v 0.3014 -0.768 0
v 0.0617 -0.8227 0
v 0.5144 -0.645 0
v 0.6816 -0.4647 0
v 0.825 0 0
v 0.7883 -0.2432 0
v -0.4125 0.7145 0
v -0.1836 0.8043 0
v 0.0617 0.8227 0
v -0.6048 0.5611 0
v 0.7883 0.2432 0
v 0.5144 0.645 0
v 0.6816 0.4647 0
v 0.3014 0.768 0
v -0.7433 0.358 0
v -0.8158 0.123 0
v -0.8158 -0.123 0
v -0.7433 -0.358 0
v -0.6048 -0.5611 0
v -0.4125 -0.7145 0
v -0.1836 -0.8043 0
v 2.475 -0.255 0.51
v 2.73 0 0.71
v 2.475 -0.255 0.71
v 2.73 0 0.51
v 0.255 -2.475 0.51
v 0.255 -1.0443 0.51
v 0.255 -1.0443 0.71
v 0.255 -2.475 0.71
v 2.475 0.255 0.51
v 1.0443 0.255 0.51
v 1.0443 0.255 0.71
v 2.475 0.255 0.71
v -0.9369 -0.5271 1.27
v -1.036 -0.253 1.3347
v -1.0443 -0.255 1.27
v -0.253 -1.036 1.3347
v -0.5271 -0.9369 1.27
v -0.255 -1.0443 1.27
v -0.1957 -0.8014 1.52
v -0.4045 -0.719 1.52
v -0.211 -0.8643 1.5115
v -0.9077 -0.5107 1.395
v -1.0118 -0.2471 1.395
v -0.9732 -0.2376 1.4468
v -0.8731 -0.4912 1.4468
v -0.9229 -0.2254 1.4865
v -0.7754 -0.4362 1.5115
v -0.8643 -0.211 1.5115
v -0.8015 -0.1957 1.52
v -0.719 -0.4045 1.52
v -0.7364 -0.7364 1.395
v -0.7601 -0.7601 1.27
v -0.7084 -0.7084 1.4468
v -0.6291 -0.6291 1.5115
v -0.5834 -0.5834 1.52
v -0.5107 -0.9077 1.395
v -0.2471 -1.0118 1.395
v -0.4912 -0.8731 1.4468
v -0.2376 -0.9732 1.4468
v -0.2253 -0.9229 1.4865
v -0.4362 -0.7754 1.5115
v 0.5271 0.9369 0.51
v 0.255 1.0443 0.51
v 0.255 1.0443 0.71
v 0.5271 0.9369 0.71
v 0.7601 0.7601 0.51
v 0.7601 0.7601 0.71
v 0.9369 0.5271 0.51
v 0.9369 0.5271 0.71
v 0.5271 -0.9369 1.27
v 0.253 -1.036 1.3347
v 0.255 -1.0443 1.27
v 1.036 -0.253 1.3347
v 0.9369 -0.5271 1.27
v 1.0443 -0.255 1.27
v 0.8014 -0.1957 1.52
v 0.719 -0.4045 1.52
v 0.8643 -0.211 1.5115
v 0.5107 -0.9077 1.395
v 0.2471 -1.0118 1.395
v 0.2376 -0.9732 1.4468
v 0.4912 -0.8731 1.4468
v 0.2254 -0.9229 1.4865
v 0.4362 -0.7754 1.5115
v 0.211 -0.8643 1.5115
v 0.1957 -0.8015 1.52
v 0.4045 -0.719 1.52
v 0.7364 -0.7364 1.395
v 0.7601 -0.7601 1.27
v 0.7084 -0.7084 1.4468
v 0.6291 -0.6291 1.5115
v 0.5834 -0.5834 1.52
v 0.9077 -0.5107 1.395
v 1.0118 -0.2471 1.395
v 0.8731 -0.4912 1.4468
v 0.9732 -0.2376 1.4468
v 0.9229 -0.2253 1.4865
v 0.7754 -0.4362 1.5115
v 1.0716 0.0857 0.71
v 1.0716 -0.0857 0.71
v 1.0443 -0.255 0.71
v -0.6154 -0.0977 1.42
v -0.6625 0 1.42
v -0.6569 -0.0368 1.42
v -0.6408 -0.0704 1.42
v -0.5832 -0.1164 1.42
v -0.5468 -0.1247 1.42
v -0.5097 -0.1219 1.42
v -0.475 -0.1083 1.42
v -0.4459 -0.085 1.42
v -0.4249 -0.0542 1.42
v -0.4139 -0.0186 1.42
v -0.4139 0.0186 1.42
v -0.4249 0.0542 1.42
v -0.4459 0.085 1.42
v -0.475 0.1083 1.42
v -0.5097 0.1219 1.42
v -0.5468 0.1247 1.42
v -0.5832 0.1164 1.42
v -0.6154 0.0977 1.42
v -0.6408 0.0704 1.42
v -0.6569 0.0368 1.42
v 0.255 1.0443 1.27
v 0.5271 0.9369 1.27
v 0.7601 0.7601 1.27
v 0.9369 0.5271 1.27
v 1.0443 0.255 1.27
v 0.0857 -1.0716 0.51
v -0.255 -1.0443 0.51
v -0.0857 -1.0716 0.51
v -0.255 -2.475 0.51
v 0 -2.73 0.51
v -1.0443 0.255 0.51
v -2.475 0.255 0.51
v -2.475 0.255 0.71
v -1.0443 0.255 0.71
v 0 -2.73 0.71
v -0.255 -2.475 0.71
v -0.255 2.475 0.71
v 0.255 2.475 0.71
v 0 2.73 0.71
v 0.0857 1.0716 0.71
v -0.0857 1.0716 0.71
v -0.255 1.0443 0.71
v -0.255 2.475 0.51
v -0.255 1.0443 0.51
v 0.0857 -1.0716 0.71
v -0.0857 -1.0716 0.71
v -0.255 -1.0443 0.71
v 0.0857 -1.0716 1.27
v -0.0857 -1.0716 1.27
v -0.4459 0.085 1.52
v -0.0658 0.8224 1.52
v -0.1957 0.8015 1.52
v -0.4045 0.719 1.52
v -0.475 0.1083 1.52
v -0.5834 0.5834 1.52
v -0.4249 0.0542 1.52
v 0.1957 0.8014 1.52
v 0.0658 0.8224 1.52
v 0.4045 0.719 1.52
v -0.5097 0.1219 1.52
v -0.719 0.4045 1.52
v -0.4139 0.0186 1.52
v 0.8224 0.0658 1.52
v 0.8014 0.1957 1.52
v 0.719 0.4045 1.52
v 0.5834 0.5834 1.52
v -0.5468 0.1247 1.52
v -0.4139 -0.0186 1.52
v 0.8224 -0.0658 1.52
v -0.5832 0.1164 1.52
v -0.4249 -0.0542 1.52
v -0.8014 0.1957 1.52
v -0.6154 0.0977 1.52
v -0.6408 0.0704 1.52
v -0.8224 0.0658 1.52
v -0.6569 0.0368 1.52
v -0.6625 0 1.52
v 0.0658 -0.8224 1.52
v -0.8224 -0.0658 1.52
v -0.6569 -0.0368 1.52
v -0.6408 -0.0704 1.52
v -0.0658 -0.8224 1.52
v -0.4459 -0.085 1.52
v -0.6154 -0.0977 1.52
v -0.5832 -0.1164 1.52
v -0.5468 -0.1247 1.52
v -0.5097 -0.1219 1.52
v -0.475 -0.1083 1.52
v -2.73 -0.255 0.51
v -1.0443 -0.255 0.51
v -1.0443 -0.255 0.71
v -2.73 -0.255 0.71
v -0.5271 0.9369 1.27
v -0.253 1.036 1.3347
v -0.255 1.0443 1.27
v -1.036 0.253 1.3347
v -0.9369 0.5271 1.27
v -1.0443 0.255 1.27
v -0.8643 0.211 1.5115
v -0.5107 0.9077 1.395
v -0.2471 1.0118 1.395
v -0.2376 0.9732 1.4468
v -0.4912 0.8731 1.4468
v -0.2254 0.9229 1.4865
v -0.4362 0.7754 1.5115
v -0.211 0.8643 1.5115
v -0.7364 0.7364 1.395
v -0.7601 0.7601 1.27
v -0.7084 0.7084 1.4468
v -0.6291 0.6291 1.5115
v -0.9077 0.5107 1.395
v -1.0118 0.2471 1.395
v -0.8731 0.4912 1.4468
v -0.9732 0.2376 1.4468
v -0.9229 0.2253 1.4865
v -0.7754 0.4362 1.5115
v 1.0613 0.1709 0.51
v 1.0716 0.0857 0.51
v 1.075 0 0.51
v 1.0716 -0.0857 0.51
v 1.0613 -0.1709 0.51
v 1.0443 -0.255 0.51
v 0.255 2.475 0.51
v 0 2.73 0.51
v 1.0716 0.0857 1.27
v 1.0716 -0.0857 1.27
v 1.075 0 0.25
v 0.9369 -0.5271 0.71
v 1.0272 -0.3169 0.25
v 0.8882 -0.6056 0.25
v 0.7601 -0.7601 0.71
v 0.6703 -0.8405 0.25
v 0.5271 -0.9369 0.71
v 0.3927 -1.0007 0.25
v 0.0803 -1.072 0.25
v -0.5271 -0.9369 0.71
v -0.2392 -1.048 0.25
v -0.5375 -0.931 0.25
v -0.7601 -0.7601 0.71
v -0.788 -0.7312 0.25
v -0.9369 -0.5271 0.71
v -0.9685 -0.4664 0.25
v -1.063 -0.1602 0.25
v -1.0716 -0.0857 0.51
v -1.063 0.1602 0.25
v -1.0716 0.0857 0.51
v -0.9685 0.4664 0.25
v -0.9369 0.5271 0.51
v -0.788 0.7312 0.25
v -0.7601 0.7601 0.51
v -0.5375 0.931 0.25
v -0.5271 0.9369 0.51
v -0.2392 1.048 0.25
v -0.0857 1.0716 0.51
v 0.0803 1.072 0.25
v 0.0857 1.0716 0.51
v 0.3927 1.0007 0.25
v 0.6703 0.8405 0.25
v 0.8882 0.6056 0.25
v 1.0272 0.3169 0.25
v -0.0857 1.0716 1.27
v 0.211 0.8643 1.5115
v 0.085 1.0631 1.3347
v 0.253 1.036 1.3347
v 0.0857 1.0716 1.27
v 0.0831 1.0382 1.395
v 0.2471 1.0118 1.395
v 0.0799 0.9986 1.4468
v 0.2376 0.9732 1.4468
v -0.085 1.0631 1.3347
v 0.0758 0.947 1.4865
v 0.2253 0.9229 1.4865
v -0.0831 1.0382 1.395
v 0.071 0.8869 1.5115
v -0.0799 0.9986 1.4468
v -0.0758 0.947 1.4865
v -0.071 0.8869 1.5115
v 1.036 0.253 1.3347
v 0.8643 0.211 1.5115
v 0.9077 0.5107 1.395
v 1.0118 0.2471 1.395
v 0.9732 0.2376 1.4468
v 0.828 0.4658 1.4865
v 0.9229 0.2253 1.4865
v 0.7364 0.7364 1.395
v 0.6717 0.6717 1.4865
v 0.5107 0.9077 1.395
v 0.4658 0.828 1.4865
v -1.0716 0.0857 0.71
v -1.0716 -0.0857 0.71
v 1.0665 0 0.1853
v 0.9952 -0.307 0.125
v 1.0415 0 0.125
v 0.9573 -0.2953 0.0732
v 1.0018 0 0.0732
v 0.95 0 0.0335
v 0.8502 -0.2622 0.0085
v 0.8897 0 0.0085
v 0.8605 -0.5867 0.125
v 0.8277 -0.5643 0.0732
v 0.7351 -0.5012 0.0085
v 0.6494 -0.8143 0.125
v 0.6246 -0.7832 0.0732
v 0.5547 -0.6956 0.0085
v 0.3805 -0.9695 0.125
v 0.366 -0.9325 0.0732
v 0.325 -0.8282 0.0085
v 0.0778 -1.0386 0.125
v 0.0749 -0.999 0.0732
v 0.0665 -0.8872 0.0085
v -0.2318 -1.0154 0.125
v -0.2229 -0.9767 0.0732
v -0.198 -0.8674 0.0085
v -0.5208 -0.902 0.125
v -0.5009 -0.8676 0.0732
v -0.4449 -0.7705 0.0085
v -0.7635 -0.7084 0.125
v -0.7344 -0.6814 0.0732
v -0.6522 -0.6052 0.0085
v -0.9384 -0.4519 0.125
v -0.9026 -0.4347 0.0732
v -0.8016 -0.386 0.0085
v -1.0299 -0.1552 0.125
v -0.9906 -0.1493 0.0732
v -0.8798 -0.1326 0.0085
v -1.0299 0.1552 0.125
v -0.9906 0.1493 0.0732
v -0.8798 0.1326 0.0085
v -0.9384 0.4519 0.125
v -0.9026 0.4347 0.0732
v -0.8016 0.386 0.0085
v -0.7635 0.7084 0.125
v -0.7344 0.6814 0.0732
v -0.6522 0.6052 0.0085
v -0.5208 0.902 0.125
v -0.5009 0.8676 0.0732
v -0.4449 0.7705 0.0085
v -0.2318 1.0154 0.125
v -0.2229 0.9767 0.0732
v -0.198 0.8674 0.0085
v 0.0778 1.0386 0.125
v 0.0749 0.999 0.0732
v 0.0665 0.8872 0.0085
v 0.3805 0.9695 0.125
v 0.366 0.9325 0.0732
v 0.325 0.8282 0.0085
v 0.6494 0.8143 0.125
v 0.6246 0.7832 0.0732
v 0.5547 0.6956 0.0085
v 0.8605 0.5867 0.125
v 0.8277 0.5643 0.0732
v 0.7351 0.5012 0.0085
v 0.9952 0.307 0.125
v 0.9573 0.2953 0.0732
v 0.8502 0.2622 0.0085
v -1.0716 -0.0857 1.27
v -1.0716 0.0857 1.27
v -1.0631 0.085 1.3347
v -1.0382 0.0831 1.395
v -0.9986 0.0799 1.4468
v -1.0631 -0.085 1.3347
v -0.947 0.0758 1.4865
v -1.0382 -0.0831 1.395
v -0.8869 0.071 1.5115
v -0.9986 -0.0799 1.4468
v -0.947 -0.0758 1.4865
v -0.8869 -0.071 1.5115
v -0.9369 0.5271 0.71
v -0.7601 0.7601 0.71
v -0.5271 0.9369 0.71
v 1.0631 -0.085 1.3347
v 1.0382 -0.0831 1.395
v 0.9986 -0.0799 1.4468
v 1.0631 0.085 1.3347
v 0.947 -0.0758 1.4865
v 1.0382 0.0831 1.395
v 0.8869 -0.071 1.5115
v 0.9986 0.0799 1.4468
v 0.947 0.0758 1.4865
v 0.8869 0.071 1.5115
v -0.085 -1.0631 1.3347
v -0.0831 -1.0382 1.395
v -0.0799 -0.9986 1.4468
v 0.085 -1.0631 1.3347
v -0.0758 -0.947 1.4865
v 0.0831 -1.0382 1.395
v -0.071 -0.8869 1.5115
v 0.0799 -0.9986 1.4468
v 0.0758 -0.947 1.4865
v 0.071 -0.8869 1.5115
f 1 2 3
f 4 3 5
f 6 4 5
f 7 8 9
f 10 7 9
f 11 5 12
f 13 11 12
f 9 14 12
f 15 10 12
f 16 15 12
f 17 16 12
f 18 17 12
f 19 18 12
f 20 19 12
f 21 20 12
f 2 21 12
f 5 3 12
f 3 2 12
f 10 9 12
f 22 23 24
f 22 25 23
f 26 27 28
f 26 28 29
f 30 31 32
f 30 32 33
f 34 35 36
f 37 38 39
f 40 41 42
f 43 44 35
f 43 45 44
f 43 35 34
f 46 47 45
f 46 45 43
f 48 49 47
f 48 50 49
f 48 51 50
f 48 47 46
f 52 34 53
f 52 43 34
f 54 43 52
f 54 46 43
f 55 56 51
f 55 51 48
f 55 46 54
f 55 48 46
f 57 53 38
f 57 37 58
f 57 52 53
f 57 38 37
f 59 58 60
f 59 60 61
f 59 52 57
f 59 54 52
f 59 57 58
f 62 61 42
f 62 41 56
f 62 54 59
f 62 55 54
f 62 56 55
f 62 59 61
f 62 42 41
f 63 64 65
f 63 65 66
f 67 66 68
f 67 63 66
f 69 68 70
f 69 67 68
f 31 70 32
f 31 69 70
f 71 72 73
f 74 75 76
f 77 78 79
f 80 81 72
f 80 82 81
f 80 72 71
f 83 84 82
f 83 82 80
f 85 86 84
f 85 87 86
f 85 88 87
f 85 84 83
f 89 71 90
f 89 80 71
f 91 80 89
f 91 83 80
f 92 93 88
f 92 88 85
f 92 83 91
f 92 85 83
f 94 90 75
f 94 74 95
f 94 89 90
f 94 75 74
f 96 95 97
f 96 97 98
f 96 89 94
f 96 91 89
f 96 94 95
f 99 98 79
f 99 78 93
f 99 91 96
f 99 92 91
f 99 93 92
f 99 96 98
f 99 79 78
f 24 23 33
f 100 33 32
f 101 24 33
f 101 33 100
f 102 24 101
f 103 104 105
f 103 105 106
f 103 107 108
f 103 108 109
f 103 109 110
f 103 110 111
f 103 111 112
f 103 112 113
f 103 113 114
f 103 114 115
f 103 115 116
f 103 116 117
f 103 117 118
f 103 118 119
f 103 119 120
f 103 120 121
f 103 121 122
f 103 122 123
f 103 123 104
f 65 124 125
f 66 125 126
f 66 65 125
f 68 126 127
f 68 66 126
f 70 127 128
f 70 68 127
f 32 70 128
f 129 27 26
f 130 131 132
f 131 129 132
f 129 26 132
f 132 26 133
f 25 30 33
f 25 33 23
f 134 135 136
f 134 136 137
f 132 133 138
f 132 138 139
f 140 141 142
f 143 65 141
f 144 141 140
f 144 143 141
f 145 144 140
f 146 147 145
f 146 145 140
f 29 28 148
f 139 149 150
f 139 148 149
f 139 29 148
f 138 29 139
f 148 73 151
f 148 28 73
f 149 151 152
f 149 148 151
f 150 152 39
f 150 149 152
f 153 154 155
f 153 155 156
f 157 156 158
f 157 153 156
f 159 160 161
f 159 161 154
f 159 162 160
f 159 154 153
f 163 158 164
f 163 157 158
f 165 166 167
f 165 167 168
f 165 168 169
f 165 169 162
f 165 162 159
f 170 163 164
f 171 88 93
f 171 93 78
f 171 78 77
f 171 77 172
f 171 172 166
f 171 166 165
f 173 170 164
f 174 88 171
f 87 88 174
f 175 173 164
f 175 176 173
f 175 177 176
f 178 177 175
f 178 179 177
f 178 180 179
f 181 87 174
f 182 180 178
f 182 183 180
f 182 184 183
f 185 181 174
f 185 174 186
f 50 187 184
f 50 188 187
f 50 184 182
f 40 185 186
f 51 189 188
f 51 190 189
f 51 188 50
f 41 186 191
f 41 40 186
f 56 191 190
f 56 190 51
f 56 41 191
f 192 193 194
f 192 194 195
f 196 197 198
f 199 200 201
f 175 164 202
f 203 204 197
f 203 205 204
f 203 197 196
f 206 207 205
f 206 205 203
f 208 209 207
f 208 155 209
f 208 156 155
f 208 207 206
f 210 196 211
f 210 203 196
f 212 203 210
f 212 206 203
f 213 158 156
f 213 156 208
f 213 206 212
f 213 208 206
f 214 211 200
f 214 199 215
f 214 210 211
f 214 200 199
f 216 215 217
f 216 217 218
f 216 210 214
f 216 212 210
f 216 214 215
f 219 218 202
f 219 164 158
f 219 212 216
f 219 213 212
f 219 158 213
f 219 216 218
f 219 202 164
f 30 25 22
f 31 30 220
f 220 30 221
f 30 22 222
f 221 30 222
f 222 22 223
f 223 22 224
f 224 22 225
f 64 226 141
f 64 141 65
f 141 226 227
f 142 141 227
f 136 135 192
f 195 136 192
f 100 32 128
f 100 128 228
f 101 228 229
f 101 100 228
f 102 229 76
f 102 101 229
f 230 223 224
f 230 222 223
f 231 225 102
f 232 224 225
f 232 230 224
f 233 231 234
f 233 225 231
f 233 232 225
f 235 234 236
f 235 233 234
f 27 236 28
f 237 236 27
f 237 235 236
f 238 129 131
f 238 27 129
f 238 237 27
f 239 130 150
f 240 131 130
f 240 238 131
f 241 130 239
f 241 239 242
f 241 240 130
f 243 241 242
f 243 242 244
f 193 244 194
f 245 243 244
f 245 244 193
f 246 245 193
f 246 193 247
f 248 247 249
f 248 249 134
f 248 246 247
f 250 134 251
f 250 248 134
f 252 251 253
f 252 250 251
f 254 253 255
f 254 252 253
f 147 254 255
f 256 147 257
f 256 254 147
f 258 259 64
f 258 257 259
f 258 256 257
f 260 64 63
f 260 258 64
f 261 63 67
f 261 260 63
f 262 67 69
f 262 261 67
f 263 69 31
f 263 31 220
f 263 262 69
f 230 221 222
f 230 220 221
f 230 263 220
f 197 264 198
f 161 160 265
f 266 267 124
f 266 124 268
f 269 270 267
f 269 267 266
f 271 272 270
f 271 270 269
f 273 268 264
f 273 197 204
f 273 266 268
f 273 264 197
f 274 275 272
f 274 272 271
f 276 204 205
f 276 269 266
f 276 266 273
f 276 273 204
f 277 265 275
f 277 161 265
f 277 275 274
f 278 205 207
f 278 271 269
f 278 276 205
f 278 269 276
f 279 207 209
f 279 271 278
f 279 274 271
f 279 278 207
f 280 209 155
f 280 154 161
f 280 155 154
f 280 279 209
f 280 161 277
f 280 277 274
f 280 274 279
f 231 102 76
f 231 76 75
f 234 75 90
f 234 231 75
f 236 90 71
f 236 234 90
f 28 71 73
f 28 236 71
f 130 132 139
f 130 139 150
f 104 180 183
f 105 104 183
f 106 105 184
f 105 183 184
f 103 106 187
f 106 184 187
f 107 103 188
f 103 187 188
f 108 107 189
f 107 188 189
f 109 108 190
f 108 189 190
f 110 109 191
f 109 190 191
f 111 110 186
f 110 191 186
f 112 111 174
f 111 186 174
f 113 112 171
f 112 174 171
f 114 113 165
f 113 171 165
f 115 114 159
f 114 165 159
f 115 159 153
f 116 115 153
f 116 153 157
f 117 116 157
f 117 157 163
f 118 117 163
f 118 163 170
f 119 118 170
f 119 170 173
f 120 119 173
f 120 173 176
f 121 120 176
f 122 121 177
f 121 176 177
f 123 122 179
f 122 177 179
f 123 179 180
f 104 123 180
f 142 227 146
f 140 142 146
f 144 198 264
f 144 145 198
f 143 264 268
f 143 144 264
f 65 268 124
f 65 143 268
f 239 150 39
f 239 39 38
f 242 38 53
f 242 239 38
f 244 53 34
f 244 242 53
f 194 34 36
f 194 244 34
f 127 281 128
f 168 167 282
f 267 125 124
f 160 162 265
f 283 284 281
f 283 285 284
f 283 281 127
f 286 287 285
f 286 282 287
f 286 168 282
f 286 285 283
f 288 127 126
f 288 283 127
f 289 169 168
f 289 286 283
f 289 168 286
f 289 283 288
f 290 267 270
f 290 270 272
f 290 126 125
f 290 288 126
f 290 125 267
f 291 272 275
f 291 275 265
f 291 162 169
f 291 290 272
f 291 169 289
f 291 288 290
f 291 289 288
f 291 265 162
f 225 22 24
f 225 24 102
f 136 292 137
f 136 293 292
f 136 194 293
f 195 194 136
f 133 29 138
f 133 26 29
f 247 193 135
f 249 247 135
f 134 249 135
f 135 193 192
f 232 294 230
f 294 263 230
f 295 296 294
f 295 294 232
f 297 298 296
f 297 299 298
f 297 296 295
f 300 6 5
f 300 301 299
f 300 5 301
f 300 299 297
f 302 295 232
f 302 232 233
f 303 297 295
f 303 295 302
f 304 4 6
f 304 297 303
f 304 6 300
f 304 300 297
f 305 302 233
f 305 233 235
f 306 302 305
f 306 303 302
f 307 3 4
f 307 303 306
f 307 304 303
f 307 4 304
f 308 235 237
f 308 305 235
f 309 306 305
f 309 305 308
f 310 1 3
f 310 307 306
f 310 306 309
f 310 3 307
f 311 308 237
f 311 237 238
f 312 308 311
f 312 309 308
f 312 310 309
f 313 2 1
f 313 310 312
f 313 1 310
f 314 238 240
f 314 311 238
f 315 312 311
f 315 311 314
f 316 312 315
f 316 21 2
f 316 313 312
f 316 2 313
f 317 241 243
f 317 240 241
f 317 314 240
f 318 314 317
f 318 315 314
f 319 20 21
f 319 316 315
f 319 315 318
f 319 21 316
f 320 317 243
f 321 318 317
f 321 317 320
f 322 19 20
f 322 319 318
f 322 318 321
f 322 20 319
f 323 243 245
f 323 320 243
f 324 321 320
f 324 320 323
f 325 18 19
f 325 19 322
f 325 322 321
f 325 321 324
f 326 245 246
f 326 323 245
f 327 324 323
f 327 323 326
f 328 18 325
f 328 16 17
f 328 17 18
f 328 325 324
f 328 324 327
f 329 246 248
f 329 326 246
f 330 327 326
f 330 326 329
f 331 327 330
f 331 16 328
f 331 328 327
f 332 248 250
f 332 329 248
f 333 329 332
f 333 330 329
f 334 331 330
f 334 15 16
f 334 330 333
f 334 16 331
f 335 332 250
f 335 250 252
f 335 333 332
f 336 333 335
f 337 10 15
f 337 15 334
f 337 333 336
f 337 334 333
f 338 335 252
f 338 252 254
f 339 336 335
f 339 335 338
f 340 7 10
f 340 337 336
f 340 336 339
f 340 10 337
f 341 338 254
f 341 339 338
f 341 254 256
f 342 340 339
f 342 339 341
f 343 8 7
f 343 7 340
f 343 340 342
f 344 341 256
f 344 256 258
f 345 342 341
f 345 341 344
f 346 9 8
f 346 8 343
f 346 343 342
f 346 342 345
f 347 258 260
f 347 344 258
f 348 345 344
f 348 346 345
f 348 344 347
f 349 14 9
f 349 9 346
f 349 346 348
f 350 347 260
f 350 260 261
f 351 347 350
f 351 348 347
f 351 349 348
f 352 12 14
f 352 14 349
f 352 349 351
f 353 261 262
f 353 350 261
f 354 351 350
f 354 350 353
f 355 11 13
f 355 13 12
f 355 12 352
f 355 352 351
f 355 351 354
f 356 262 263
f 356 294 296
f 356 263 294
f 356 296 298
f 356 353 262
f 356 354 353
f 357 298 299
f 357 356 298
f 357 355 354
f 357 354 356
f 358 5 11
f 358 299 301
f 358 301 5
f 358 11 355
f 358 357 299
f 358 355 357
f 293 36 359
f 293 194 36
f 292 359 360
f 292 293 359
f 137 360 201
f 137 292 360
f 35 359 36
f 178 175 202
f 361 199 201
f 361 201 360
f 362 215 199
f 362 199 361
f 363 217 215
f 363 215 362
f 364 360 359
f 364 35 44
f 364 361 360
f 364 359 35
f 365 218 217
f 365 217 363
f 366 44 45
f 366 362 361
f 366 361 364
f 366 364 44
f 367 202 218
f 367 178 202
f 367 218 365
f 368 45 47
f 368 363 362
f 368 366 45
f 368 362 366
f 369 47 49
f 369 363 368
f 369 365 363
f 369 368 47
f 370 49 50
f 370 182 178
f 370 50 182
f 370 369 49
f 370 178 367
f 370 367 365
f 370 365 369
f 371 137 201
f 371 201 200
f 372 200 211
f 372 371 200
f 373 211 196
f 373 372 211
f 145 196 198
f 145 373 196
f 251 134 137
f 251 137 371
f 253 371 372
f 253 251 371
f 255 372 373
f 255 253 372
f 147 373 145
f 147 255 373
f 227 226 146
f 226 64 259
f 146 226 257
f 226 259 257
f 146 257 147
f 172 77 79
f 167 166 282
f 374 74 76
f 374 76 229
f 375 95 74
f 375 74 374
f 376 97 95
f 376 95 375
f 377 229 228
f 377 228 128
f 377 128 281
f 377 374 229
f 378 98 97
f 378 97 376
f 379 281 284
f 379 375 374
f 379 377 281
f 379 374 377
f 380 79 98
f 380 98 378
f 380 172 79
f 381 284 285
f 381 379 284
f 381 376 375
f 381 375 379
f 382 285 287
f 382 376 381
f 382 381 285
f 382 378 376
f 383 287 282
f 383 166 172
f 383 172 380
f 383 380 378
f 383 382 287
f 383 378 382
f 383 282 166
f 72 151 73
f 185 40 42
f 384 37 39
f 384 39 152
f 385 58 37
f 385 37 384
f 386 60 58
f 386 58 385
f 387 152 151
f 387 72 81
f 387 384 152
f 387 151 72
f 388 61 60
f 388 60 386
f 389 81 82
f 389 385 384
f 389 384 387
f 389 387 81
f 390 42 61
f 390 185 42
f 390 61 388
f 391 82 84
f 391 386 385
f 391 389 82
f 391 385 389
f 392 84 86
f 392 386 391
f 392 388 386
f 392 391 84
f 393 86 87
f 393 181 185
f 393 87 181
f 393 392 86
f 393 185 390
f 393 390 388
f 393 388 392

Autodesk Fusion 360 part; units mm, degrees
sketch "Sketch1" plane through (0, 0, 0) normal (0, 0, 1) x (1, 0, 0)
  circle A0 centre (0, 0) radius 1.075
  dimension "d1" = 2.15
extrude "Extrude1" add sketch "Sketch1" along normal blind 0.51
sketch "Sketch2" plane through (0, 0, 0.51) normal (0, 0, 1) x (-1, 0, 0)
  circle A0 centre (0, 0) radius 1.075
  line L0 (0, 0) -> (-1.075, 0) construction
  line L1 (0, 0) -> (-2.73, 0) construction
  line L2 (0, 0) -> (2.73, 0) construction
  line L3 (2.73, 0.255) -> (2.73, -0.255) construction
  line L4 (0, -2.73) -> (0, -2.73)
  line L5 (0, -2.73) -> (0.255, -2.475)
  line L6 (-0.255, -2.475) -> (0, -2.73)
  line L7 (-0.255, 2.475) -> (0, 2.73)
  line L8 (0, 2.73) -> (0.255, 2.475)
  line L9 (-2.475, -0.255) -> (-2.73, 0)
  line L10 (-2.73, 0) -> (-2.475, 0.255)
  line L11 (2.73, 0.255) -> (2.475, 0.255) construction
  line L12 (2.475, 0.255) -> (2.475, -0.255) construction
  line L13 (2.475, -0.255) -> (2.73, 0.255)
  arc A1 (-1.0443, -0.255) -> (-0.255, -1.0443) centre (0, 0) ccw
  arc A2 (0.255, -1.0443) -> (1.0443, -0.255) centre (0, 0) ccw
  arc A3 (-0.255, 1.0443) -> (-1.0443, 0.255) centre (0, 0) ccw
  arc A4 (1.0443, 0.255) -> (0.255, 1.0443) centre (0, 0) ccw
  line L14 (2.475, -0.255) -> (1.0443, -0.255)
  line L15 (-1.0443, -0.255) -> (-2.475, -0.255)
  line L16 (0.255, 2.475) -> (0.255, 1.0443)
  line L17 (0.255, -1.0443) -> (0.255, -2.475)
  line L18 (0.255, 2.475) -> (0.255, 1.0443)
  line L19 (0.255, -1.0443) -> (0.255, -2.475)
  line L20 (-0.255, -2.475) -> (-0.255, -1.0443)
  line L21 (-0.255, -2.475) -> (-0.255, -1.0443)
  line L22 (-2.475, 0.255) -> (-1.0443, 0.255)
  line L23 (1.0443, 0.255) -> (2.73, 0.255)
  line L24 (-0.255, 1.0443) -> (-0.255, 2.475)
  line L25 (-0.255, 1.0443) -> (-0.255, 2.475)
  point P0 (-2.73, -0.255)
  dimension "d4" = 2.73
  dimension "d5" = 2.73
  dimension "d6" = 0.51
  dimension "d8" = 0.51
  dimension "d21" = 0.255
extrude "Extrude2" add sketch "Sketch2" along normal blind 0.2
sketch "Sketch3" plane through (0, 0, 0.71) normal (0, 0, 1) x (-1, 0, 0)
  arc A0 (-1.0443, -0.255) -> (-0.255, -1.0443) centre (0, 0) ccw
  line L0 (-0.255, -1.0443) -> (-0.255, -2.475)
  line L1 (-0.255, -2.475) -> (0, -2.73)
  line L2 (0, -2.73) -> (0.255, -2.475)
  line L3 (0.255, -2.475) -> (0.255, -1.0443)
  arc A1 (0.255, -1.0443) -> (1.0443, -0.255) centre (0, 0) ccw
  line L4 (1.0443, -0.255) -> (2.475, -0.255)
  line L5 (2.475, -0.255) -> (2.73, 0.255)
  line L6 (2.73, 0.255) -> (1.0443, 0.255)
  arc A2 (1.0443, 0.255) -> (0.255, 1.0443) centre (0, 0) ccw
  line L7 (0.255, 1.0443) -> (0.255, 2.475)
  line L8 (0.255, 2.475) -> (0, 2.73)
  line L9 (0, 2.73) -> (-0.255, 2.475)
  line L10 (-0.255, 2.475) -> (-0.255, 1.0443)
  arc A3 (-0.255, 1.0443) -> (-1.0443, 0.255) centre (0, 0) ccw
  line L11 (-1.0443, 0.255) -> (-2.475, 0.255)
  line L12 (-2.475, 0.255) -> (-2.73, 0)
  line L13 (-2.73, 0) -> (-2.475, -0.255)
  line L14 (-2.475, -0.255) -> (-1.0443, -0.255)
  circle A4 centre (0, 0) radius 1.075
extrude "Extrude3" add sketch "Sketch3" along normal blind 0.81 contours A0 A1 A2 A3 A4
fillet "Fillet1" radius 0.25 1 edges at (1.0023, 0.3887, 1.52)
fillet "Fillet2" radius 0.25 1 edges at (-1.0023, -0.3887, 0)
sketch "Sketch4" plane through (0, 0, 1.52) normal (0, 0, 1) x (-1, 0, 0)
  circle A0 centre (0, 0) radius 0.825
  line L0 (0, 0) -> (0.5375, 0) construction
  circle A1 centre (0.5375, 0) radius 0.125
  dimension "d30" = 0.5375
  dimension "d31" = 0.25
extrude "Extrude4" cut sketch "Sketch4" against normal blind 0.1 contours A1
